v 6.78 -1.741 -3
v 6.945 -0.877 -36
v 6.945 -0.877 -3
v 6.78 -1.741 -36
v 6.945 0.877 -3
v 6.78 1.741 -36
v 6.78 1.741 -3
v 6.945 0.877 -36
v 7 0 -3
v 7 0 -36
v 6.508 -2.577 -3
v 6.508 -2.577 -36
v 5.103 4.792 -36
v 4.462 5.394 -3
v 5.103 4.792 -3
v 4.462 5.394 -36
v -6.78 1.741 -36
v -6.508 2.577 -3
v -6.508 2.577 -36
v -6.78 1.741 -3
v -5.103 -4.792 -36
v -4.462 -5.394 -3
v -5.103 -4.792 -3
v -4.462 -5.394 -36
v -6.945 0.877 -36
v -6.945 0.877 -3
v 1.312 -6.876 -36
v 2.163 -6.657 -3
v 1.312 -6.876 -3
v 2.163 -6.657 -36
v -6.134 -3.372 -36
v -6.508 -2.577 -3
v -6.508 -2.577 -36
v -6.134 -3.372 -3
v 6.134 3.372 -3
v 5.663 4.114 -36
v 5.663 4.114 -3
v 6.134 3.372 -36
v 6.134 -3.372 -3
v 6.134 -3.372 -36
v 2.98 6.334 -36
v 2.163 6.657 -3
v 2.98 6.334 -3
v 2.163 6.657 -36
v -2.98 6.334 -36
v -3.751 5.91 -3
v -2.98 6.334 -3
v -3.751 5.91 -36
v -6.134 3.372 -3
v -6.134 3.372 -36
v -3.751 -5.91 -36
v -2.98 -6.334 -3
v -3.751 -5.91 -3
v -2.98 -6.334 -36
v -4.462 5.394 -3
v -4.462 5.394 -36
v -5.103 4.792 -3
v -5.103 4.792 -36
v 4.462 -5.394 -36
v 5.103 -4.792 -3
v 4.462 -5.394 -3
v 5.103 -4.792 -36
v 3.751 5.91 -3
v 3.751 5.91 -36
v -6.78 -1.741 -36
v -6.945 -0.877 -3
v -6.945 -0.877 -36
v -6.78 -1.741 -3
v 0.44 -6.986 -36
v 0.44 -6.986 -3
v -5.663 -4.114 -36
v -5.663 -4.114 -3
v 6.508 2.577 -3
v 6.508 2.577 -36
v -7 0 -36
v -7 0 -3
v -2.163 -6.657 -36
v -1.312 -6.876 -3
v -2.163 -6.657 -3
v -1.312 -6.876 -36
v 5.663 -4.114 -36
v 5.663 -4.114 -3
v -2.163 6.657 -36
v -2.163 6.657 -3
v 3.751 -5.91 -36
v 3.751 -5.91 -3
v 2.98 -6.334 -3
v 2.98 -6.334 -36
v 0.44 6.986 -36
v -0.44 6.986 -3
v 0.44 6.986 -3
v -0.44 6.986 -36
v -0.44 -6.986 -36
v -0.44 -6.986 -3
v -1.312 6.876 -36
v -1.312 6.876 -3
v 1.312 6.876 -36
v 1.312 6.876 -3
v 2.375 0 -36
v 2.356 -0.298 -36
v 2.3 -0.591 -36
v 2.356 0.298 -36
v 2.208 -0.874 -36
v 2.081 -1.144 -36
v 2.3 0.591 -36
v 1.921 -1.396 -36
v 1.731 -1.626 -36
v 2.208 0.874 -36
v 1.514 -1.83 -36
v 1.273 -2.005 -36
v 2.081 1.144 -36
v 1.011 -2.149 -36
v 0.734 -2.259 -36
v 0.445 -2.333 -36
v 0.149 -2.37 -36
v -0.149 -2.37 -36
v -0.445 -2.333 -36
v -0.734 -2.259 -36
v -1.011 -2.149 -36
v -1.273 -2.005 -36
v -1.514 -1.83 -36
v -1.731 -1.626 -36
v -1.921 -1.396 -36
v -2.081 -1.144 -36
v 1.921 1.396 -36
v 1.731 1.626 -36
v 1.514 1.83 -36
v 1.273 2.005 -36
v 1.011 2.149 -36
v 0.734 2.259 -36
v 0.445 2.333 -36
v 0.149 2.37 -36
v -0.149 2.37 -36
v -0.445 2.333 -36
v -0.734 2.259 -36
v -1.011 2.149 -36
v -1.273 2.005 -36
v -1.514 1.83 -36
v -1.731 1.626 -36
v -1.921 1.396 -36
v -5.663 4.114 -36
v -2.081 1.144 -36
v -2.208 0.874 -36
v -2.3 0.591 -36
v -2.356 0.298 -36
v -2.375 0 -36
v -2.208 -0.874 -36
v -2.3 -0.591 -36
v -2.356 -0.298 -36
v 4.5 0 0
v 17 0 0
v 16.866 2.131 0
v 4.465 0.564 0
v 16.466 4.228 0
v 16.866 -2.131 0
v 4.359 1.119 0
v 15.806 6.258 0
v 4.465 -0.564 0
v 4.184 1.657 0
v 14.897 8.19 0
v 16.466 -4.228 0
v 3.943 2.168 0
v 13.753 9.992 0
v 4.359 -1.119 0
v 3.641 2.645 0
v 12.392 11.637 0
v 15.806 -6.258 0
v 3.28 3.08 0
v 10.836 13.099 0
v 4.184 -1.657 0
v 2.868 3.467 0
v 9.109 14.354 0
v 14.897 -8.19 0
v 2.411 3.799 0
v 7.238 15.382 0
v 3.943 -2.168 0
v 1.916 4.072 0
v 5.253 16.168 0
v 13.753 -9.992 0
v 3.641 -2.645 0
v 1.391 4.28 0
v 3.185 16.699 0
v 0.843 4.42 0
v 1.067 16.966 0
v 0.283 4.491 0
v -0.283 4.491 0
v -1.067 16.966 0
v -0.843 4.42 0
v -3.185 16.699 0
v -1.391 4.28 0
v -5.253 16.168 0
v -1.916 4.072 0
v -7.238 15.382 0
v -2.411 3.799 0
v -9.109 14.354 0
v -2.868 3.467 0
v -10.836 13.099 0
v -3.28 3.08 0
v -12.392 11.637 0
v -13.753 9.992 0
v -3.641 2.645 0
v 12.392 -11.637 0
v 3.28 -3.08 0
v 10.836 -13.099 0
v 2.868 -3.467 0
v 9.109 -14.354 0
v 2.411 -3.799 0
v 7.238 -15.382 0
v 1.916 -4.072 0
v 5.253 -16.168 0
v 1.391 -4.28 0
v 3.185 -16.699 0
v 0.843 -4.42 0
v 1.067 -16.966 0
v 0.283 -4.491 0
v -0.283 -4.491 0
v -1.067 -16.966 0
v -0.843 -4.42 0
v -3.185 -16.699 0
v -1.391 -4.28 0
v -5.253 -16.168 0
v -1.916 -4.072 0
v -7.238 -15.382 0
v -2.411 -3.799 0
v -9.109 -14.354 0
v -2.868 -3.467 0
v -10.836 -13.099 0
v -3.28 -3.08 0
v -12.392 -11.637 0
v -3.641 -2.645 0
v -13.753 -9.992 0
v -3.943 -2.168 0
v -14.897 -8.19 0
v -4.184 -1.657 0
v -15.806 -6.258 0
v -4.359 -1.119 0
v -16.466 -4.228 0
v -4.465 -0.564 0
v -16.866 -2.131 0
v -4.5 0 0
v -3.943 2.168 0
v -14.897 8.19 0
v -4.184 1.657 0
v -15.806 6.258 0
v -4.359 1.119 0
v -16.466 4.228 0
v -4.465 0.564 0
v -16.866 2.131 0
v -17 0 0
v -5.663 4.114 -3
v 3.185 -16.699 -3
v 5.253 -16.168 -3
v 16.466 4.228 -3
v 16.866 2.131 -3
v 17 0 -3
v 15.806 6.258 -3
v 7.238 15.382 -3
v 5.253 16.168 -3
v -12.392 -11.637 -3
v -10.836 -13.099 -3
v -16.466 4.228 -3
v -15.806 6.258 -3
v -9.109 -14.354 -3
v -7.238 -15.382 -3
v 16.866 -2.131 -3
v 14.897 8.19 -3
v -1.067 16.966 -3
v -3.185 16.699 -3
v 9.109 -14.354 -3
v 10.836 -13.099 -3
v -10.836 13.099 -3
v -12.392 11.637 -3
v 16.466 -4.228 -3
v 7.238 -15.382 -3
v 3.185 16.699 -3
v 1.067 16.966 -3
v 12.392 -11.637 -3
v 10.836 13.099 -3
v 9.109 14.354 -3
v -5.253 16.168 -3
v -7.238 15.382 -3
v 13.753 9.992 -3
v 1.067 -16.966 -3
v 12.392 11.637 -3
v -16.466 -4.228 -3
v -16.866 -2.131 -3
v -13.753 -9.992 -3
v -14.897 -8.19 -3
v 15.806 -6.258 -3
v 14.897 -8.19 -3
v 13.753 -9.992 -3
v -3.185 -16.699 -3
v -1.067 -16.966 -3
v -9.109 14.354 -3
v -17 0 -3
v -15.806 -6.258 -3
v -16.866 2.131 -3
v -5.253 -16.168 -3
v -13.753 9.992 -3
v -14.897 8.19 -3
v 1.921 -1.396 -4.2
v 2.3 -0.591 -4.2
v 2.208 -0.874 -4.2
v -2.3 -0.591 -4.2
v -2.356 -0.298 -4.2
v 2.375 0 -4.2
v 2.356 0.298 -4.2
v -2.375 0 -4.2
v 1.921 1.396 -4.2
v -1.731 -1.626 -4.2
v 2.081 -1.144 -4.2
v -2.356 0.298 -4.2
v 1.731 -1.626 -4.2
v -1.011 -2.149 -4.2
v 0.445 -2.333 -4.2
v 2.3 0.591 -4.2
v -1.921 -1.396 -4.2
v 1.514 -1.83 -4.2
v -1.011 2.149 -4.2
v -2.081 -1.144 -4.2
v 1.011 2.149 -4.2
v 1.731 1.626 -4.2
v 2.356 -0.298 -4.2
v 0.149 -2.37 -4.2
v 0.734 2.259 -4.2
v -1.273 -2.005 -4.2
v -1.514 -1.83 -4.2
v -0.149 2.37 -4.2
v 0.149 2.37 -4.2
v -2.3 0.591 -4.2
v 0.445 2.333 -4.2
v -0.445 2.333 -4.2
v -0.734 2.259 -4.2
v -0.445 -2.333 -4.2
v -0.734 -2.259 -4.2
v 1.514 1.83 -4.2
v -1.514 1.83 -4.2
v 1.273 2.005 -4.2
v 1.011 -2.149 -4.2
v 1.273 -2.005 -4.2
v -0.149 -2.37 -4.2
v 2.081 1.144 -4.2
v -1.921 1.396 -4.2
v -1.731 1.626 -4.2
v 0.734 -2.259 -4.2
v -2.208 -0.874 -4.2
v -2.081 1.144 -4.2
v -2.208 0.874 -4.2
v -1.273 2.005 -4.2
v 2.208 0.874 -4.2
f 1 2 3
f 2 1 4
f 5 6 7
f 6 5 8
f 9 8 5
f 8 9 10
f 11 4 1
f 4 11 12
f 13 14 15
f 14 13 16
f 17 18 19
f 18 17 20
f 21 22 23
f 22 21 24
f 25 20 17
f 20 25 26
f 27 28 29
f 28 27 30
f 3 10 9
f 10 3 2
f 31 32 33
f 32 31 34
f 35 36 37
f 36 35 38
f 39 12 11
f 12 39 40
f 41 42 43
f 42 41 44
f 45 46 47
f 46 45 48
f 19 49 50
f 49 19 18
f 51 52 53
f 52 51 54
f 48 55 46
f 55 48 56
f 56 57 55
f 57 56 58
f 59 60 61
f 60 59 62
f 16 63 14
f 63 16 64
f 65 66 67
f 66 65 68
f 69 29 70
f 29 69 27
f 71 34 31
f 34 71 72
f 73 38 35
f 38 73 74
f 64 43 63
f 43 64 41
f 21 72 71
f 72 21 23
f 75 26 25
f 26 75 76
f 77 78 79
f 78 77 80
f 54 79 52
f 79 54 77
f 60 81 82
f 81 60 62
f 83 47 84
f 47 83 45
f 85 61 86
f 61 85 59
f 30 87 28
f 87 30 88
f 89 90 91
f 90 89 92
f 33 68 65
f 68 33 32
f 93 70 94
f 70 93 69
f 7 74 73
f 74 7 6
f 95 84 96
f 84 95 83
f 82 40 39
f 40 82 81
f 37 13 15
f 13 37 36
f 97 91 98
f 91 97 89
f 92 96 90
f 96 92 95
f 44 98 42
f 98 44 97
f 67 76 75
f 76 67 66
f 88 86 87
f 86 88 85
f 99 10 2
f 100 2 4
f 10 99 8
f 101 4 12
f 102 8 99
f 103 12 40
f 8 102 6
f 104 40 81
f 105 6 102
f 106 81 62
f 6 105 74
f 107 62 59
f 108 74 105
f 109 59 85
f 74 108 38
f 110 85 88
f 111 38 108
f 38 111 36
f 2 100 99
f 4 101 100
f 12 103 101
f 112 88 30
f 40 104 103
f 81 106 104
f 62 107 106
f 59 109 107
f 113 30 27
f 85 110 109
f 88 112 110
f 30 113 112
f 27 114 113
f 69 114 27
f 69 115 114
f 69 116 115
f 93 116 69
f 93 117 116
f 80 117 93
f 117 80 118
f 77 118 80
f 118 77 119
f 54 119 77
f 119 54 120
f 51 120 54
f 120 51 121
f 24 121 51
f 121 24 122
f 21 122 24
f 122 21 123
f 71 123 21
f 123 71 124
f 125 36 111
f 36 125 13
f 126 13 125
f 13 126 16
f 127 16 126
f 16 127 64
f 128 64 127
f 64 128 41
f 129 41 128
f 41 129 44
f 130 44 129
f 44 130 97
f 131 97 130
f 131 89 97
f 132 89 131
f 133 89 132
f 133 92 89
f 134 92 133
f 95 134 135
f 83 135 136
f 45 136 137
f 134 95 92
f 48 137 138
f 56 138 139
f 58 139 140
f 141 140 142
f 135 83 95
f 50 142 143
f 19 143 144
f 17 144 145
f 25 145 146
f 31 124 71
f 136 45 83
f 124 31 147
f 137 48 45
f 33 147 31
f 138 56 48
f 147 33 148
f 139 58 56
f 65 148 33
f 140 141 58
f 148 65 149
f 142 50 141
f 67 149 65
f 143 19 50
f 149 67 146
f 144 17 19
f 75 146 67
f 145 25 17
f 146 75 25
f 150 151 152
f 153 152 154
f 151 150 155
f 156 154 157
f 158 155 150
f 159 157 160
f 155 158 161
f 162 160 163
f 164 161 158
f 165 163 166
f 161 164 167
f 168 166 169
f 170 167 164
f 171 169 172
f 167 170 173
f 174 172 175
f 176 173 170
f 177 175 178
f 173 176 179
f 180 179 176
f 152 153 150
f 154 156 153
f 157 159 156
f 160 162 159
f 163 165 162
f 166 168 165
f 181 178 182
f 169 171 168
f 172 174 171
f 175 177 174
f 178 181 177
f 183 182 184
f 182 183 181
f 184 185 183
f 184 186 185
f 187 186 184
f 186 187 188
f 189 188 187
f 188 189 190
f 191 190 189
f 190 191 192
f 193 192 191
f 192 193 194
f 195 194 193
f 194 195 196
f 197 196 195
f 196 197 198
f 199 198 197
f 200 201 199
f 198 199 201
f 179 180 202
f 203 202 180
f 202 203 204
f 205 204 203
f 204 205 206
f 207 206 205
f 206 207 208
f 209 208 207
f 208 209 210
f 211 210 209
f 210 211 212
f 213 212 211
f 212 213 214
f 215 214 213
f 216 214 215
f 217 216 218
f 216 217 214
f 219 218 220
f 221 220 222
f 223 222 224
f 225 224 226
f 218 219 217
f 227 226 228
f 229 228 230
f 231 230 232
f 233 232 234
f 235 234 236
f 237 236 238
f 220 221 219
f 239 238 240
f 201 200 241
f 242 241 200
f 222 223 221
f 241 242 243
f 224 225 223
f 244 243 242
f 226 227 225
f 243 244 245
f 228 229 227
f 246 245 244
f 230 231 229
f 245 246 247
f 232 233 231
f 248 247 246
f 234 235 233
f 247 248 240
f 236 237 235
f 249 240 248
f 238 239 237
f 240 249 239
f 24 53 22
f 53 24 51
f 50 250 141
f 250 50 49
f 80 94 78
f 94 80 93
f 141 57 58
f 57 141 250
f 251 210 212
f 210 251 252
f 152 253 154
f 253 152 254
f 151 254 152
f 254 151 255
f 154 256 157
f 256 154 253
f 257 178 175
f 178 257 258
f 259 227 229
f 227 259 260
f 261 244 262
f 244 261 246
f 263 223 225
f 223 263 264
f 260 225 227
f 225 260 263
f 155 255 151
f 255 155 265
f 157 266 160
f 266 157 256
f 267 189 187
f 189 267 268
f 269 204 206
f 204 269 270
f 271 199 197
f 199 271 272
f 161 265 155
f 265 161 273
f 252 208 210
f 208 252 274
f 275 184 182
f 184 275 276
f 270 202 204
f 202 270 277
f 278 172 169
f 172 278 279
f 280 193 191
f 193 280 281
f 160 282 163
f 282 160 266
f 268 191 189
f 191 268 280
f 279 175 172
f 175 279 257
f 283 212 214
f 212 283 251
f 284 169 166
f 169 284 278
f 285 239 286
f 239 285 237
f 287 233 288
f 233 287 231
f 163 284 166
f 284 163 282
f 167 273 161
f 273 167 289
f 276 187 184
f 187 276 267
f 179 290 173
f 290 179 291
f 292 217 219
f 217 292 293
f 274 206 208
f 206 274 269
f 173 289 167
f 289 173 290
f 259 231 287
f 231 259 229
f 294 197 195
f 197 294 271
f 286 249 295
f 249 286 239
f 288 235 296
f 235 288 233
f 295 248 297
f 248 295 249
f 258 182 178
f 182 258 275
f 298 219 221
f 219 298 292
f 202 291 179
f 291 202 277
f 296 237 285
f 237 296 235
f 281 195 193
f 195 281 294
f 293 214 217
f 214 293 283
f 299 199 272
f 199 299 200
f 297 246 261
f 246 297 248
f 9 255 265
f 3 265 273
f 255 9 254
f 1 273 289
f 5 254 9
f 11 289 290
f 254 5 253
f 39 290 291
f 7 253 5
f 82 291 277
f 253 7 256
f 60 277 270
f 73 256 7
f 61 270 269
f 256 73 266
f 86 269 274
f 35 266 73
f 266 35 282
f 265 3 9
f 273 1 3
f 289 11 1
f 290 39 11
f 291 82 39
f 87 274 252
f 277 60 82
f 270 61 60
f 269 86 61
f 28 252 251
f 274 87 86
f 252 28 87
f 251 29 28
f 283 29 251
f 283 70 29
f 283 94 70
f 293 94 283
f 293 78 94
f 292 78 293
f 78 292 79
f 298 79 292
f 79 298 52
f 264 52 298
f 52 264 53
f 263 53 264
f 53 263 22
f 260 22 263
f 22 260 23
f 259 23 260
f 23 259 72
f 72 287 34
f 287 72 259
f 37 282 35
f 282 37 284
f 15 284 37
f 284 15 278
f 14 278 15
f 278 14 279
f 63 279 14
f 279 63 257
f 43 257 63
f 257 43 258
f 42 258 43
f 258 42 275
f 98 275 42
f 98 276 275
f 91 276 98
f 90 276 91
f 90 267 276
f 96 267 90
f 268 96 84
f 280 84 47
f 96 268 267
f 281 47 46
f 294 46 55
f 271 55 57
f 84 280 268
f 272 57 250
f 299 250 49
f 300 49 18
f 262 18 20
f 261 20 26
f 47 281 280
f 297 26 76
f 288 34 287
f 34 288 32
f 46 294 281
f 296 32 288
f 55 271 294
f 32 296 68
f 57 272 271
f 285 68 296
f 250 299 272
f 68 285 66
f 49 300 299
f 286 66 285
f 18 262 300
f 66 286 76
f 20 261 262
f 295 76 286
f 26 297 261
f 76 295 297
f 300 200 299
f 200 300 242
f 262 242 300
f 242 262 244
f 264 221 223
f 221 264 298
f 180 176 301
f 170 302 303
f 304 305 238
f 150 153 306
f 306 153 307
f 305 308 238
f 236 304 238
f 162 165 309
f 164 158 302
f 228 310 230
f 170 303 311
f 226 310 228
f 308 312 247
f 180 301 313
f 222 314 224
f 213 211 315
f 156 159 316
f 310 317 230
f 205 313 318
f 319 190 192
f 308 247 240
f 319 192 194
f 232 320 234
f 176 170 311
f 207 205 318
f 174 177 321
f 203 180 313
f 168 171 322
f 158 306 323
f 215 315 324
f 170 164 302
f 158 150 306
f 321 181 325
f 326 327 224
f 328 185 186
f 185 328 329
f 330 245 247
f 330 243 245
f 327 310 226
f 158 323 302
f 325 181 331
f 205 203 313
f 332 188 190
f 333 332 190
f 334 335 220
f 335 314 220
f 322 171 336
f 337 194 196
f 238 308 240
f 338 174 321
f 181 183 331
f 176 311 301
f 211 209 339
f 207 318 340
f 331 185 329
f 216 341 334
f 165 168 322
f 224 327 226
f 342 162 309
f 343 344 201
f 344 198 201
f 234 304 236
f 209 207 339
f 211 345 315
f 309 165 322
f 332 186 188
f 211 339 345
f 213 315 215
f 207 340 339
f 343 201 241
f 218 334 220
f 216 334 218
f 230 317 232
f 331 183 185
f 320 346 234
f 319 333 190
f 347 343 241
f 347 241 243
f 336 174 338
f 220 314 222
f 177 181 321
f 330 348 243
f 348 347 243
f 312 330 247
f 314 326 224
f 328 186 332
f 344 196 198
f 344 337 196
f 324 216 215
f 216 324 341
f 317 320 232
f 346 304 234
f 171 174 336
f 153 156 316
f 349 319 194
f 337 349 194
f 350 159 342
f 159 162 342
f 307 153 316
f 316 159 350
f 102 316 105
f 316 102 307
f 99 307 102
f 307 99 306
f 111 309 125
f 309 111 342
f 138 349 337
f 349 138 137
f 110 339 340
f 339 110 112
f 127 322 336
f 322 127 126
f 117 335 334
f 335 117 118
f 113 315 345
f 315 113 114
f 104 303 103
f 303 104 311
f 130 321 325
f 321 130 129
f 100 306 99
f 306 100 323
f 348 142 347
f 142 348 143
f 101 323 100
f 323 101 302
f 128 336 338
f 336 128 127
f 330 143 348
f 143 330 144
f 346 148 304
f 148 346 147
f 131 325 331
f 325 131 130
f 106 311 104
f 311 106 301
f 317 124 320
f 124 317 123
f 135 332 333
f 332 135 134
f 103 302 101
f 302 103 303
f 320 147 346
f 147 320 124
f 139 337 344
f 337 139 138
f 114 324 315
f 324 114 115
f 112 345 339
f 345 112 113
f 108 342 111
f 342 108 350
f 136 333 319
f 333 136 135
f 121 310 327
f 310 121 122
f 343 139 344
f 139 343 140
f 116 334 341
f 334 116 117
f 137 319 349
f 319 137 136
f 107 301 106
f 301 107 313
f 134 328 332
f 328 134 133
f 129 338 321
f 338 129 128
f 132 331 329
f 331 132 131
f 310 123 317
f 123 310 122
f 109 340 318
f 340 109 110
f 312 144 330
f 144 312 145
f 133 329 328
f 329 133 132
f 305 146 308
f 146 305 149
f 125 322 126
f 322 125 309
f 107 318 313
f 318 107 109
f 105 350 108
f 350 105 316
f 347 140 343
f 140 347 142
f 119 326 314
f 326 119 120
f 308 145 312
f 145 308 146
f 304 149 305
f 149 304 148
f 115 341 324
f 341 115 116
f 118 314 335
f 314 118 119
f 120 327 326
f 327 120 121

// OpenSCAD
$fn = 50;


difference() {
	union() {
		translate(v = [0, 0, -36.0000000000]) {
			cylinder(h = 36, r = 7.0000000000);
		}
		translate(v = [0, 0, -3.0000000000]) {
			cylinder(h = 3, r = 17.0000000000);
		}
	}
	union() {
		translate(v = [0, 0, 0]) {
			rotate(a = [0, 0, 0]) {
				difference() {
					union() {
						#translate(v = [0, 0, -36.0000000000]) {
							cylinder(h = 36, r = 2.2500000000);
						}
						#translate(v = [0, 0, -4.2000000000]) {
							cylinder(h = 4.2000000000, r = 7.0000000000, r1 = 2.3750000000, r2 = 4.5000000000);
						}
						#translate(v = [0, 0, -36.0000000000]) {
							cylinder(h = 36, r = 2.3750000000);
						}
						#translate(v = [0, 0, -36.0000000000]) {
							cylinder(h = 36, r = 2.2500000000);
						}
					}
					union();
				}
			}
		}
	}
}
